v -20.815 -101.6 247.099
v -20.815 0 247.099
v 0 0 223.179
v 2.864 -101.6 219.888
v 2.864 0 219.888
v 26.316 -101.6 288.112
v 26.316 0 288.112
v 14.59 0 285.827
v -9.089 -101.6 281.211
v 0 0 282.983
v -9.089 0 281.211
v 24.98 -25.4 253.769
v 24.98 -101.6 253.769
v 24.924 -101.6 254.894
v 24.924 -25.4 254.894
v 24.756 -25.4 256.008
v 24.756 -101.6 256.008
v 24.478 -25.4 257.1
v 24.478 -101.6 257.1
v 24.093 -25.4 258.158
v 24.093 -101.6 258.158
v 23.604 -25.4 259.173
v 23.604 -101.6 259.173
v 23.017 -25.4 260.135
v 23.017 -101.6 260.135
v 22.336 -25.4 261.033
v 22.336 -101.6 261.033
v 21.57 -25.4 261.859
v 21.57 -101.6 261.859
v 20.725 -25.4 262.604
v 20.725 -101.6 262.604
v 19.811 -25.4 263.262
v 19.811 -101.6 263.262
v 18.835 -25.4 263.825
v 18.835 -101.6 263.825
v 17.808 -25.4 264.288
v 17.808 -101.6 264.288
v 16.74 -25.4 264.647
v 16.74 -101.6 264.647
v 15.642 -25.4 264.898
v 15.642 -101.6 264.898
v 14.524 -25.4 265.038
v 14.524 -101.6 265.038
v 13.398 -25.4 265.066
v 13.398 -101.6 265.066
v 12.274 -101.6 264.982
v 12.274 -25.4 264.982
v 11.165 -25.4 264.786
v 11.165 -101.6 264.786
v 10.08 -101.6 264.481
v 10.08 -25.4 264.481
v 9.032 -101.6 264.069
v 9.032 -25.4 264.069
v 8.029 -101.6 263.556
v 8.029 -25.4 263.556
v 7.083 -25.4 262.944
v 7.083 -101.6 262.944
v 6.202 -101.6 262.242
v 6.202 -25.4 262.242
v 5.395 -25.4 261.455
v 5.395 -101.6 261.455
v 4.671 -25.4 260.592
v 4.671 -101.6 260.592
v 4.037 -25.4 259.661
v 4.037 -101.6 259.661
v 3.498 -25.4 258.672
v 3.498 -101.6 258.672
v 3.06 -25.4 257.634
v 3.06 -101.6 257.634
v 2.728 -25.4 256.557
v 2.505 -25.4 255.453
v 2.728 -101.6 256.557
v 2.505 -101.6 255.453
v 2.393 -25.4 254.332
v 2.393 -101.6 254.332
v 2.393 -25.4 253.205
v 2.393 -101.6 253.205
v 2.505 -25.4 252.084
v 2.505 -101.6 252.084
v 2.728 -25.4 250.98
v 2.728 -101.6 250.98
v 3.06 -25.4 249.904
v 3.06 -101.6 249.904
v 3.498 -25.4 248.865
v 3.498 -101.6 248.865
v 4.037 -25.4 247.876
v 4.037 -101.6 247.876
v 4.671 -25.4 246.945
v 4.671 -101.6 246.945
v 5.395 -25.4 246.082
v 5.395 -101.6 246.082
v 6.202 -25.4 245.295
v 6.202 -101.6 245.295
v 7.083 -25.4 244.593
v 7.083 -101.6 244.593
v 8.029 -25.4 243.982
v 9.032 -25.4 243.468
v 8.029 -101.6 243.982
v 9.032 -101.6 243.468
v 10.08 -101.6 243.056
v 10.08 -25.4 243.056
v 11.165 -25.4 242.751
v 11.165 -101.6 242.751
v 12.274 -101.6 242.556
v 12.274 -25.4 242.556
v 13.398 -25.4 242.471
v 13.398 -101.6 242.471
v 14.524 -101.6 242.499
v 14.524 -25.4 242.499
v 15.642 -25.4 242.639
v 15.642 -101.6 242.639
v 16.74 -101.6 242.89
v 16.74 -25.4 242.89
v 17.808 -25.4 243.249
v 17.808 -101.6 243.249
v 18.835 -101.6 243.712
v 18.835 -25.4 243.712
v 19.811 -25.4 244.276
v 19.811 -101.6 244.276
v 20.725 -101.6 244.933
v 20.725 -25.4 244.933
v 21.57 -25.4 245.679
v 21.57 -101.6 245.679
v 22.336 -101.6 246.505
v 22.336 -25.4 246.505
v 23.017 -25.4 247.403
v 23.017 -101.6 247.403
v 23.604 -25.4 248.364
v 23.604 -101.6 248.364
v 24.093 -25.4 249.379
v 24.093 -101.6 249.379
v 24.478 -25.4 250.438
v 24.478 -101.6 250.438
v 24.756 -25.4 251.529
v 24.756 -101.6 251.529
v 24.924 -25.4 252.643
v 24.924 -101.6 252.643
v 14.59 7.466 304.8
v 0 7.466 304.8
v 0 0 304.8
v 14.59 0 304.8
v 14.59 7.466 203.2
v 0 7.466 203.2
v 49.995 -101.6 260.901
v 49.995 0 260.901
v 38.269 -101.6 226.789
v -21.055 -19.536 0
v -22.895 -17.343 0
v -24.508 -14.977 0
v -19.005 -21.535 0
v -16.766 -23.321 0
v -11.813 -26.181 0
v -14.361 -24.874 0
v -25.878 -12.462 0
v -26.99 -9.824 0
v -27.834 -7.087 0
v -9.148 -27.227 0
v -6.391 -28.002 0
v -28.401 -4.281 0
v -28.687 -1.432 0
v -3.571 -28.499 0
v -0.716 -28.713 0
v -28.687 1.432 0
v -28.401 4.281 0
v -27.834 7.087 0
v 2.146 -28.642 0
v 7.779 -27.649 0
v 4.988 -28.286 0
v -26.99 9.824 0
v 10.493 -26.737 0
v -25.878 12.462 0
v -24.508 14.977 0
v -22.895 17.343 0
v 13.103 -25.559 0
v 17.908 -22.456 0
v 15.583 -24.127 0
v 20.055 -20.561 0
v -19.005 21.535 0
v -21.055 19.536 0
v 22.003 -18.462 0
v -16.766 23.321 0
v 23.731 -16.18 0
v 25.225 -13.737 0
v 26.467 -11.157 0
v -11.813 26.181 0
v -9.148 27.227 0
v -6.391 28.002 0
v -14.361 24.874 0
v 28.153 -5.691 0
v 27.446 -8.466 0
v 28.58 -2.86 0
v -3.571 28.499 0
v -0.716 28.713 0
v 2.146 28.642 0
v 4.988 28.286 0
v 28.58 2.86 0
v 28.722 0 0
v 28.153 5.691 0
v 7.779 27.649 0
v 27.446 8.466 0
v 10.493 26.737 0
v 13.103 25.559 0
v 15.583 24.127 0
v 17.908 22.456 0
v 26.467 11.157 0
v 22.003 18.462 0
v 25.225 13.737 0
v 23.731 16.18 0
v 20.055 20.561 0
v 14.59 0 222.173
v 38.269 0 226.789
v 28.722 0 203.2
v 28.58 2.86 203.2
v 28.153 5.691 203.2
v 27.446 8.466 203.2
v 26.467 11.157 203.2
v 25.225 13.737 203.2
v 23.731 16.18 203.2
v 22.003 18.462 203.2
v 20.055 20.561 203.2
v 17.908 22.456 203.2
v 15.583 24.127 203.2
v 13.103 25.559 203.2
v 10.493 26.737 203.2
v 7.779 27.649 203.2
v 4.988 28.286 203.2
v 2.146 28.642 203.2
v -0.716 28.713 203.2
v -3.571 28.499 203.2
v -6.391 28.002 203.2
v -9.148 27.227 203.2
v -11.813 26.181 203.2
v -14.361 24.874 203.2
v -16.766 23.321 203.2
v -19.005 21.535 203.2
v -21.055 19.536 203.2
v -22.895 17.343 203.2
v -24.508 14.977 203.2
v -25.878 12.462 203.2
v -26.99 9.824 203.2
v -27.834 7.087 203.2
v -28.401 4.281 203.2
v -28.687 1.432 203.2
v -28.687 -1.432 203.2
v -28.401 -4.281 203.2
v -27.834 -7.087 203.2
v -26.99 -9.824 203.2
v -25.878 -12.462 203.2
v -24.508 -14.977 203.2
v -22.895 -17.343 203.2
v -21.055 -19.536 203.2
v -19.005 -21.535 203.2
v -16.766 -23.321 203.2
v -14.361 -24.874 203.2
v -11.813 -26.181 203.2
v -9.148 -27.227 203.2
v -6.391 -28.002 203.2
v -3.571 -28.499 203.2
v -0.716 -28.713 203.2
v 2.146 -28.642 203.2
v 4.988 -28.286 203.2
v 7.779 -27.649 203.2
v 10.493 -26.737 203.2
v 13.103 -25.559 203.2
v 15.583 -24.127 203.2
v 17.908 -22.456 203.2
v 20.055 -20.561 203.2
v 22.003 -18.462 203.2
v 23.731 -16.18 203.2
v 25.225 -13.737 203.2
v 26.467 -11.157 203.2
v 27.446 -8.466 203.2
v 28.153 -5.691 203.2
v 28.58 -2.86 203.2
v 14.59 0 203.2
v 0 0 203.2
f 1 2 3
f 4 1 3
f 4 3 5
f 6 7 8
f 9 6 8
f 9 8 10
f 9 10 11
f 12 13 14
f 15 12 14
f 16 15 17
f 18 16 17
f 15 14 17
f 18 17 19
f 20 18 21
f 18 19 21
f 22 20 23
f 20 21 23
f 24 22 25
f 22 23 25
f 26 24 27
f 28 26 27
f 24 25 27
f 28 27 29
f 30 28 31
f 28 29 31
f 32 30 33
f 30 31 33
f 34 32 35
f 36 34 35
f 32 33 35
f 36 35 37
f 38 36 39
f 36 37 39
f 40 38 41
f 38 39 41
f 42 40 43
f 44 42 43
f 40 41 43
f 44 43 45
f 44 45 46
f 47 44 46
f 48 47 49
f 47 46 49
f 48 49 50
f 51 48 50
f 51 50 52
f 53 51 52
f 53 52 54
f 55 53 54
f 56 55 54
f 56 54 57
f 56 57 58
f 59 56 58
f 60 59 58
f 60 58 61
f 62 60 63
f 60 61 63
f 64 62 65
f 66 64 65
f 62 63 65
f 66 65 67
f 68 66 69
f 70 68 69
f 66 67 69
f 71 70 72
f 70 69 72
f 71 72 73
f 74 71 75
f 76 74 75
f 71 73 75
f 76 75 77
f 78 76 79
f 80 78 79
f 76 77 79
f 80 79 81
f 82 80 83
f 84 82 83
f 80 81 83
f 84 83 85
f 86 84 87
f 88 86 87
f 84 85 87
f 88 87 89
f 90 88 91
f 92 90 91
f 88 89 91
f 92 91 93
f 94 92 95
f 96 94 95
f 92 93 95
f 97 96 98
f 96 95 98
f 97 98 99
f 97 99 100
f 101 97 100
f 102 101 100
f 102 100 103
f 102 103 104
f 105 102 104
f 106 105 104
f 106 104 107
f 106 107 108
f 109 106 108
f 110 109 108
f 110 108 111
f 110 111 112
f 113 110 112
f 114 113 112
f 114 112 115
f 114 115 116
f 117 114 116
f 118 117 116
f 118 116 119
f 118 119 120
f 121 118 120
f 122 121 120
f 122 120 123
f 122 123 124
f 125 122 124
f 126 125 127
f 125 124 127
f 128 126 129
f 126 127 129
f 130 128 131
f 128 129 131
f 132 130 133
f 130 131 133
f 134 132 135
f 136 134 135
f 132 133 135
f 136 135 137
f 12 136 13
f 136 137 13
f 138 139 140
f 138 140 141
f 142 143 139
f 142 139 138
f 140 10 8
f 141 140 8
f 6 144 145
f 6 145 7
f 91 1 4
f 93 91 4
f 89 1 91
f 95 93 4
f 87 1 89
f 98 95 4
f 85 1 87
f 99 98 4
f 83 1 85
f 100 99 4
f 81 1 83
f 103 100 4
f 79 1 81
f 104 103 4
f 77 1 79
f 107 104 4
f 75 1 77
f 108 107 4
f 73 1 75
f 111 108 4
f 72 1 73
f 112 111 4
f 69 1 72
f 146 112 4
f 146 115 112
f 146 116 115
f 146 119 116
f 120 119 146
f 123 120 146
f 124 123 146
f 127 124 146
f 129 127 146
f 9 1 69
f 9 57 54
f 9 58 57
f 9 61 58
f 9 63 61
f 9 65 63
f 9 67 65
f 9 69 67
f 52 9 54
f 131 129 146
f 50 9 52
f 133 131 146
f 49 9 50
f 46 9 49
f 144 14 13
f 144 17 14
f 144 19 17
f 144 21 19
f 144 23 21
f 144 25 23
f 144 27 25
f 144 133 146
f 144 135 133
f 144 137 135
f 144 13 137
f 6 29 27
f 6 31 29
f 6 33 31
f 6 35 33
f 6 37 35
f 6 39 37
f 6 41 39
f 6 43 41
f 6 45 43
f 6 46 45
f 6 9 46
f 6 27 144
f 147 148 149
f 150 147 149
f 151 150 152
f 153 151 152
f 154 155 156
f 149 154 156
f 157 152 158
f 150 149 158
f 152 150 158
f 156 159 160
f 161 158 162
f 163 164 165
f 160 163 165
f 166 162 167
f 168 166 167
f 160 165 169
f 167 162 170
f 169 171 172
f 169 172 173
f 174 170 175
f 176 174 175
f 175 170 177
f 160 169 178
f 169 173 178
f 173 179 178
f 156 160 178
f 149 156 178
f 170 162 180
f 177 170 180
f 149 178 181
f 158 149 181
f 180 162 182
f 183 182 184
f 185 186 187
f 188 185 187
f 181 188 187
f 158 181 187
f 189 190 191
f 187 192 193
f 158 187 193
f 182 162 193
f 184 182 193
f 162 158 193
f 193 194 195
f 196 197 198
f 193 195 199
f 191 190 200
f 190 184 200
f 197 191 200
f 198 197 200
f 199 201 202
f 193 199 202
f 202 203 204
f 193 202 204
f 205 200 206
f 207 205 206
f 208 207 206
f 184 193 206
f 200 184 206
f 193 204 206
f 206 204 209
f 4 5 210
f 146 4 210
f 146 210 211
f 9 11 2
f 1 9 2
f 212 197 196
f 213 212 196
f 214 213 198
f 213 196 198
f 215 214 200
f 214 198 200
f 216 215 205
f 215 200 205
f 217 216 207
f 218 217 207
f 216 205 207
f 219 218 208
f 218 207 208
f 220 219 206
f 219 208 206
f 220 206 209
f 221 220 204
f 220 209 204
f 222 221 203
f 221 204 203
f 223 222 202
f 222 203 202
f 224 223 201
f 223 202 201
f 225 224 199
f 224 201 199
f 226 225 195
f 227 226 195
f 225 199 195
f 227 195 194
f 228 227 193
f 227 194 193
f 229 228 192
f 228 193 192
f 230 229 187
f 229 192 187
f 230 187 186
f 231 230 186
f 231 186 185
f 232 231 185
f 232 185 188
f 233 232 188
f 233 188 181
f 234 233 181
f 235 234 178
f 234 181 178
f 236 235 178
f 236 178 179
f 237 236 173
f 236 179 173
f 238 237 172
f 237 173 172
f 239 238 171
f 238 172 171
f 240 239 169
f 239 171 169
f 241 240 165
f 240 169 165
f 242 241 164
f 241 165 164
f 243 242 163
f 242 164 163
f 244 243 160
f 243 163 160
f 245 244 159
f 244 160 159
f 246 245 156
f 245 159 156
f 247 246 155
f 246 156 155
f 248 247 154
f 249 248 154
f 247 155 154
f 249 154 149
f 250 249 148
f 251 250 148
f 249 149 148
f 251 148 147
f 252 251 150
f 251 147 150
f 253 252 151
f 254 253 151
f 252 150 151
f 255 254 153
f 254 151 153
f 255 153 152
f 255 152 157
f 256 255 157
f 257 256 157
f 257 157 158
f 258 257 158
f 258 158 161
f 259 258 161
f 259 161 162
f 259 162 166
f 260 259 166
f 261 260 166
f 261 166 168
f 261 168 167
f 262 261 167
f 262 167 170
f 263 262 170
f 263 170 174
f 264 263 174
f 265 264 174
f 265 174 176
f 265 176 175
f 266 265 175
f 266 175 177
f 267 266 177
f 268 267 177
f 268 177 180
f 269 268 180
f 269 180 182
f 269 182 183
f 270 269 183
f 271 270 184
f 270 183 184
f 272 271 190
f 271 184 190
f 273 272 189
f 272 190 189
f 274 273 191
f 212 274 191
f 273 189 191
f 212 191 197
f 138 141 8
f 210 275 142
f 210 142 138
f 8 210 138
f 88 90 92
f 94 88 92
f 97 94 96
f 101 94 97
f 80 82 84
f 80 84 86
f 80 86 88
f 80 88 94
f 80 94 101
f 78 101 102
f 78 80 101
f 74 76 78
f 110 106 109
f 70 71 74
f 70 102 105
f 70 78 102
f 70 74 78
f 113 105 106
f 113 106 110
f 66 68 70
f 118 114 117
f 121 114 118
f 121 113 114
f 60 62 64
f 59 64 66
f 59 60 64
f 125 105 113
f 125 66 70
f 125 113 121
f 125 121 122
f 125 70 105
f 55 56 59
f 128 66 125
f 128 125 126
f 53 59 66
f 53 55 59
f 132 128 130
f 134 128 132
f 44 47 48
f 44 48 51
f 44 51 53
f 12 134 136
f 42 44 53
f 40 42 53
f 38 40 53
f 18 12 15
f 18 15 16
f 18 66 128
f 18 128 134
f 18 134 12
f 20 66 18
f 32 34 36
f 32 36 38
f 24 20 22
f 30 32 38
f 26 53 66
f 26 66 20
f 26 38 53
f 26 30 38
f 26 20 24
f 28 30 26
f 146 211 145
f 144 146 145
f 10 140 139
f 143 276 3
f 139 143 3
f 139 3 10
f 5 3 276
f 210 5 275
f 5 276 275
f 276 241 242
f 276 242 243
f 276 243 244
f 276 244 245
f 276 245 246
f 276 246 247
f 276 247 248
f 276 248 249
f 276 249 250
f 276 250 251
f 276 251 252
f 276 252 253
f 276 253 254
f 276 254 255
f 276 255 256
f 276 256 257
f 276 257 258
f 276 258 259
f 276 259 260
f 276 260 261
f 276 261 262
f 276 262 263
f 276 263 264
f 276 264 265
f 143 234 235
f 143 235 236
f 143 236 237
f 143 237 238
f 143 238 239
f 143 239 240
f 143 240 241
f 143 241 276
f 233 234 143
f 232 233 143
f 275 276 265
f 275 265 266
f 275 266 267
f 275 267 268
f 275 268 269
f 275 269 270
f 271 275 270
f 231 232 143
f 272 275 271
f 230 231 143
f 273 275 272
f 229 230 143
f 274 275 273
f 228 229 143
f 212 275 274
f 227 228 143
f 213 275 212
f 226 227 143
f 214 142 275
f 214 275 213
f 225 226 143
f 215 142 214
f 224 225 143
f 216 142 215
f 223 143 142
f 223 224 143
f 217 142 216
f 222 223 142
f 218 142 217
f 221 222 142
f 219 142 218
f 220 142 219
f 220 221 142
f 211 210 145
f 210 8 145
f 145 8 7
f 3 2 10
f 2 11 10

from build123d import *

# Parameters (mm, degrees)
F0_R     = 28.722262
F1_DEPTH = 203.2
F2_W     = 14.590031
F2_H     = 7.466263
F3_DEPTH = 101.6
F5_DEPTH = 101.6
F6_R     = 11.300877
F7_DEPTH = 76.2


with BuildPart() as f1:
    # F0 (on Top) → F1 (new body)
    with BuildSketch(Plane.XY):
        Circle(F0_R)
    extrude(amount=F1_DEPTH)

    # F2 (on face) → F3 (join)
    with BuildSketch(Plane.XY.offset(203.2)):
        with Locations((7.295015, 3.733131)):
            Rectangle(F2_W, F2_H)
    extrude(amount=F3_DEPTH)

    # F4 (on face) → F5 (join)
    with BuildSketch(Plane.XZ):
        Polygon((38.268968, 226.788725), (49.995155, 260.900924), (26.316217, 288.112199), (-9.088907, 281.211275), (-20.815094, 247.099076), (2.863844, 219.887801), align=None)
    extrude(amount=F5_DEPTH)

    # F6 (on face) → F7 (cut)
    with BuildSketch(Plane.XZ.offset(101.6)):
        with Locations((13.679512, 253.768682)):
            Circle(F6_R)
    extrude(amount=-F7_DEPTH, mode=Mode.SUBTRACT)


solid = f1.part
